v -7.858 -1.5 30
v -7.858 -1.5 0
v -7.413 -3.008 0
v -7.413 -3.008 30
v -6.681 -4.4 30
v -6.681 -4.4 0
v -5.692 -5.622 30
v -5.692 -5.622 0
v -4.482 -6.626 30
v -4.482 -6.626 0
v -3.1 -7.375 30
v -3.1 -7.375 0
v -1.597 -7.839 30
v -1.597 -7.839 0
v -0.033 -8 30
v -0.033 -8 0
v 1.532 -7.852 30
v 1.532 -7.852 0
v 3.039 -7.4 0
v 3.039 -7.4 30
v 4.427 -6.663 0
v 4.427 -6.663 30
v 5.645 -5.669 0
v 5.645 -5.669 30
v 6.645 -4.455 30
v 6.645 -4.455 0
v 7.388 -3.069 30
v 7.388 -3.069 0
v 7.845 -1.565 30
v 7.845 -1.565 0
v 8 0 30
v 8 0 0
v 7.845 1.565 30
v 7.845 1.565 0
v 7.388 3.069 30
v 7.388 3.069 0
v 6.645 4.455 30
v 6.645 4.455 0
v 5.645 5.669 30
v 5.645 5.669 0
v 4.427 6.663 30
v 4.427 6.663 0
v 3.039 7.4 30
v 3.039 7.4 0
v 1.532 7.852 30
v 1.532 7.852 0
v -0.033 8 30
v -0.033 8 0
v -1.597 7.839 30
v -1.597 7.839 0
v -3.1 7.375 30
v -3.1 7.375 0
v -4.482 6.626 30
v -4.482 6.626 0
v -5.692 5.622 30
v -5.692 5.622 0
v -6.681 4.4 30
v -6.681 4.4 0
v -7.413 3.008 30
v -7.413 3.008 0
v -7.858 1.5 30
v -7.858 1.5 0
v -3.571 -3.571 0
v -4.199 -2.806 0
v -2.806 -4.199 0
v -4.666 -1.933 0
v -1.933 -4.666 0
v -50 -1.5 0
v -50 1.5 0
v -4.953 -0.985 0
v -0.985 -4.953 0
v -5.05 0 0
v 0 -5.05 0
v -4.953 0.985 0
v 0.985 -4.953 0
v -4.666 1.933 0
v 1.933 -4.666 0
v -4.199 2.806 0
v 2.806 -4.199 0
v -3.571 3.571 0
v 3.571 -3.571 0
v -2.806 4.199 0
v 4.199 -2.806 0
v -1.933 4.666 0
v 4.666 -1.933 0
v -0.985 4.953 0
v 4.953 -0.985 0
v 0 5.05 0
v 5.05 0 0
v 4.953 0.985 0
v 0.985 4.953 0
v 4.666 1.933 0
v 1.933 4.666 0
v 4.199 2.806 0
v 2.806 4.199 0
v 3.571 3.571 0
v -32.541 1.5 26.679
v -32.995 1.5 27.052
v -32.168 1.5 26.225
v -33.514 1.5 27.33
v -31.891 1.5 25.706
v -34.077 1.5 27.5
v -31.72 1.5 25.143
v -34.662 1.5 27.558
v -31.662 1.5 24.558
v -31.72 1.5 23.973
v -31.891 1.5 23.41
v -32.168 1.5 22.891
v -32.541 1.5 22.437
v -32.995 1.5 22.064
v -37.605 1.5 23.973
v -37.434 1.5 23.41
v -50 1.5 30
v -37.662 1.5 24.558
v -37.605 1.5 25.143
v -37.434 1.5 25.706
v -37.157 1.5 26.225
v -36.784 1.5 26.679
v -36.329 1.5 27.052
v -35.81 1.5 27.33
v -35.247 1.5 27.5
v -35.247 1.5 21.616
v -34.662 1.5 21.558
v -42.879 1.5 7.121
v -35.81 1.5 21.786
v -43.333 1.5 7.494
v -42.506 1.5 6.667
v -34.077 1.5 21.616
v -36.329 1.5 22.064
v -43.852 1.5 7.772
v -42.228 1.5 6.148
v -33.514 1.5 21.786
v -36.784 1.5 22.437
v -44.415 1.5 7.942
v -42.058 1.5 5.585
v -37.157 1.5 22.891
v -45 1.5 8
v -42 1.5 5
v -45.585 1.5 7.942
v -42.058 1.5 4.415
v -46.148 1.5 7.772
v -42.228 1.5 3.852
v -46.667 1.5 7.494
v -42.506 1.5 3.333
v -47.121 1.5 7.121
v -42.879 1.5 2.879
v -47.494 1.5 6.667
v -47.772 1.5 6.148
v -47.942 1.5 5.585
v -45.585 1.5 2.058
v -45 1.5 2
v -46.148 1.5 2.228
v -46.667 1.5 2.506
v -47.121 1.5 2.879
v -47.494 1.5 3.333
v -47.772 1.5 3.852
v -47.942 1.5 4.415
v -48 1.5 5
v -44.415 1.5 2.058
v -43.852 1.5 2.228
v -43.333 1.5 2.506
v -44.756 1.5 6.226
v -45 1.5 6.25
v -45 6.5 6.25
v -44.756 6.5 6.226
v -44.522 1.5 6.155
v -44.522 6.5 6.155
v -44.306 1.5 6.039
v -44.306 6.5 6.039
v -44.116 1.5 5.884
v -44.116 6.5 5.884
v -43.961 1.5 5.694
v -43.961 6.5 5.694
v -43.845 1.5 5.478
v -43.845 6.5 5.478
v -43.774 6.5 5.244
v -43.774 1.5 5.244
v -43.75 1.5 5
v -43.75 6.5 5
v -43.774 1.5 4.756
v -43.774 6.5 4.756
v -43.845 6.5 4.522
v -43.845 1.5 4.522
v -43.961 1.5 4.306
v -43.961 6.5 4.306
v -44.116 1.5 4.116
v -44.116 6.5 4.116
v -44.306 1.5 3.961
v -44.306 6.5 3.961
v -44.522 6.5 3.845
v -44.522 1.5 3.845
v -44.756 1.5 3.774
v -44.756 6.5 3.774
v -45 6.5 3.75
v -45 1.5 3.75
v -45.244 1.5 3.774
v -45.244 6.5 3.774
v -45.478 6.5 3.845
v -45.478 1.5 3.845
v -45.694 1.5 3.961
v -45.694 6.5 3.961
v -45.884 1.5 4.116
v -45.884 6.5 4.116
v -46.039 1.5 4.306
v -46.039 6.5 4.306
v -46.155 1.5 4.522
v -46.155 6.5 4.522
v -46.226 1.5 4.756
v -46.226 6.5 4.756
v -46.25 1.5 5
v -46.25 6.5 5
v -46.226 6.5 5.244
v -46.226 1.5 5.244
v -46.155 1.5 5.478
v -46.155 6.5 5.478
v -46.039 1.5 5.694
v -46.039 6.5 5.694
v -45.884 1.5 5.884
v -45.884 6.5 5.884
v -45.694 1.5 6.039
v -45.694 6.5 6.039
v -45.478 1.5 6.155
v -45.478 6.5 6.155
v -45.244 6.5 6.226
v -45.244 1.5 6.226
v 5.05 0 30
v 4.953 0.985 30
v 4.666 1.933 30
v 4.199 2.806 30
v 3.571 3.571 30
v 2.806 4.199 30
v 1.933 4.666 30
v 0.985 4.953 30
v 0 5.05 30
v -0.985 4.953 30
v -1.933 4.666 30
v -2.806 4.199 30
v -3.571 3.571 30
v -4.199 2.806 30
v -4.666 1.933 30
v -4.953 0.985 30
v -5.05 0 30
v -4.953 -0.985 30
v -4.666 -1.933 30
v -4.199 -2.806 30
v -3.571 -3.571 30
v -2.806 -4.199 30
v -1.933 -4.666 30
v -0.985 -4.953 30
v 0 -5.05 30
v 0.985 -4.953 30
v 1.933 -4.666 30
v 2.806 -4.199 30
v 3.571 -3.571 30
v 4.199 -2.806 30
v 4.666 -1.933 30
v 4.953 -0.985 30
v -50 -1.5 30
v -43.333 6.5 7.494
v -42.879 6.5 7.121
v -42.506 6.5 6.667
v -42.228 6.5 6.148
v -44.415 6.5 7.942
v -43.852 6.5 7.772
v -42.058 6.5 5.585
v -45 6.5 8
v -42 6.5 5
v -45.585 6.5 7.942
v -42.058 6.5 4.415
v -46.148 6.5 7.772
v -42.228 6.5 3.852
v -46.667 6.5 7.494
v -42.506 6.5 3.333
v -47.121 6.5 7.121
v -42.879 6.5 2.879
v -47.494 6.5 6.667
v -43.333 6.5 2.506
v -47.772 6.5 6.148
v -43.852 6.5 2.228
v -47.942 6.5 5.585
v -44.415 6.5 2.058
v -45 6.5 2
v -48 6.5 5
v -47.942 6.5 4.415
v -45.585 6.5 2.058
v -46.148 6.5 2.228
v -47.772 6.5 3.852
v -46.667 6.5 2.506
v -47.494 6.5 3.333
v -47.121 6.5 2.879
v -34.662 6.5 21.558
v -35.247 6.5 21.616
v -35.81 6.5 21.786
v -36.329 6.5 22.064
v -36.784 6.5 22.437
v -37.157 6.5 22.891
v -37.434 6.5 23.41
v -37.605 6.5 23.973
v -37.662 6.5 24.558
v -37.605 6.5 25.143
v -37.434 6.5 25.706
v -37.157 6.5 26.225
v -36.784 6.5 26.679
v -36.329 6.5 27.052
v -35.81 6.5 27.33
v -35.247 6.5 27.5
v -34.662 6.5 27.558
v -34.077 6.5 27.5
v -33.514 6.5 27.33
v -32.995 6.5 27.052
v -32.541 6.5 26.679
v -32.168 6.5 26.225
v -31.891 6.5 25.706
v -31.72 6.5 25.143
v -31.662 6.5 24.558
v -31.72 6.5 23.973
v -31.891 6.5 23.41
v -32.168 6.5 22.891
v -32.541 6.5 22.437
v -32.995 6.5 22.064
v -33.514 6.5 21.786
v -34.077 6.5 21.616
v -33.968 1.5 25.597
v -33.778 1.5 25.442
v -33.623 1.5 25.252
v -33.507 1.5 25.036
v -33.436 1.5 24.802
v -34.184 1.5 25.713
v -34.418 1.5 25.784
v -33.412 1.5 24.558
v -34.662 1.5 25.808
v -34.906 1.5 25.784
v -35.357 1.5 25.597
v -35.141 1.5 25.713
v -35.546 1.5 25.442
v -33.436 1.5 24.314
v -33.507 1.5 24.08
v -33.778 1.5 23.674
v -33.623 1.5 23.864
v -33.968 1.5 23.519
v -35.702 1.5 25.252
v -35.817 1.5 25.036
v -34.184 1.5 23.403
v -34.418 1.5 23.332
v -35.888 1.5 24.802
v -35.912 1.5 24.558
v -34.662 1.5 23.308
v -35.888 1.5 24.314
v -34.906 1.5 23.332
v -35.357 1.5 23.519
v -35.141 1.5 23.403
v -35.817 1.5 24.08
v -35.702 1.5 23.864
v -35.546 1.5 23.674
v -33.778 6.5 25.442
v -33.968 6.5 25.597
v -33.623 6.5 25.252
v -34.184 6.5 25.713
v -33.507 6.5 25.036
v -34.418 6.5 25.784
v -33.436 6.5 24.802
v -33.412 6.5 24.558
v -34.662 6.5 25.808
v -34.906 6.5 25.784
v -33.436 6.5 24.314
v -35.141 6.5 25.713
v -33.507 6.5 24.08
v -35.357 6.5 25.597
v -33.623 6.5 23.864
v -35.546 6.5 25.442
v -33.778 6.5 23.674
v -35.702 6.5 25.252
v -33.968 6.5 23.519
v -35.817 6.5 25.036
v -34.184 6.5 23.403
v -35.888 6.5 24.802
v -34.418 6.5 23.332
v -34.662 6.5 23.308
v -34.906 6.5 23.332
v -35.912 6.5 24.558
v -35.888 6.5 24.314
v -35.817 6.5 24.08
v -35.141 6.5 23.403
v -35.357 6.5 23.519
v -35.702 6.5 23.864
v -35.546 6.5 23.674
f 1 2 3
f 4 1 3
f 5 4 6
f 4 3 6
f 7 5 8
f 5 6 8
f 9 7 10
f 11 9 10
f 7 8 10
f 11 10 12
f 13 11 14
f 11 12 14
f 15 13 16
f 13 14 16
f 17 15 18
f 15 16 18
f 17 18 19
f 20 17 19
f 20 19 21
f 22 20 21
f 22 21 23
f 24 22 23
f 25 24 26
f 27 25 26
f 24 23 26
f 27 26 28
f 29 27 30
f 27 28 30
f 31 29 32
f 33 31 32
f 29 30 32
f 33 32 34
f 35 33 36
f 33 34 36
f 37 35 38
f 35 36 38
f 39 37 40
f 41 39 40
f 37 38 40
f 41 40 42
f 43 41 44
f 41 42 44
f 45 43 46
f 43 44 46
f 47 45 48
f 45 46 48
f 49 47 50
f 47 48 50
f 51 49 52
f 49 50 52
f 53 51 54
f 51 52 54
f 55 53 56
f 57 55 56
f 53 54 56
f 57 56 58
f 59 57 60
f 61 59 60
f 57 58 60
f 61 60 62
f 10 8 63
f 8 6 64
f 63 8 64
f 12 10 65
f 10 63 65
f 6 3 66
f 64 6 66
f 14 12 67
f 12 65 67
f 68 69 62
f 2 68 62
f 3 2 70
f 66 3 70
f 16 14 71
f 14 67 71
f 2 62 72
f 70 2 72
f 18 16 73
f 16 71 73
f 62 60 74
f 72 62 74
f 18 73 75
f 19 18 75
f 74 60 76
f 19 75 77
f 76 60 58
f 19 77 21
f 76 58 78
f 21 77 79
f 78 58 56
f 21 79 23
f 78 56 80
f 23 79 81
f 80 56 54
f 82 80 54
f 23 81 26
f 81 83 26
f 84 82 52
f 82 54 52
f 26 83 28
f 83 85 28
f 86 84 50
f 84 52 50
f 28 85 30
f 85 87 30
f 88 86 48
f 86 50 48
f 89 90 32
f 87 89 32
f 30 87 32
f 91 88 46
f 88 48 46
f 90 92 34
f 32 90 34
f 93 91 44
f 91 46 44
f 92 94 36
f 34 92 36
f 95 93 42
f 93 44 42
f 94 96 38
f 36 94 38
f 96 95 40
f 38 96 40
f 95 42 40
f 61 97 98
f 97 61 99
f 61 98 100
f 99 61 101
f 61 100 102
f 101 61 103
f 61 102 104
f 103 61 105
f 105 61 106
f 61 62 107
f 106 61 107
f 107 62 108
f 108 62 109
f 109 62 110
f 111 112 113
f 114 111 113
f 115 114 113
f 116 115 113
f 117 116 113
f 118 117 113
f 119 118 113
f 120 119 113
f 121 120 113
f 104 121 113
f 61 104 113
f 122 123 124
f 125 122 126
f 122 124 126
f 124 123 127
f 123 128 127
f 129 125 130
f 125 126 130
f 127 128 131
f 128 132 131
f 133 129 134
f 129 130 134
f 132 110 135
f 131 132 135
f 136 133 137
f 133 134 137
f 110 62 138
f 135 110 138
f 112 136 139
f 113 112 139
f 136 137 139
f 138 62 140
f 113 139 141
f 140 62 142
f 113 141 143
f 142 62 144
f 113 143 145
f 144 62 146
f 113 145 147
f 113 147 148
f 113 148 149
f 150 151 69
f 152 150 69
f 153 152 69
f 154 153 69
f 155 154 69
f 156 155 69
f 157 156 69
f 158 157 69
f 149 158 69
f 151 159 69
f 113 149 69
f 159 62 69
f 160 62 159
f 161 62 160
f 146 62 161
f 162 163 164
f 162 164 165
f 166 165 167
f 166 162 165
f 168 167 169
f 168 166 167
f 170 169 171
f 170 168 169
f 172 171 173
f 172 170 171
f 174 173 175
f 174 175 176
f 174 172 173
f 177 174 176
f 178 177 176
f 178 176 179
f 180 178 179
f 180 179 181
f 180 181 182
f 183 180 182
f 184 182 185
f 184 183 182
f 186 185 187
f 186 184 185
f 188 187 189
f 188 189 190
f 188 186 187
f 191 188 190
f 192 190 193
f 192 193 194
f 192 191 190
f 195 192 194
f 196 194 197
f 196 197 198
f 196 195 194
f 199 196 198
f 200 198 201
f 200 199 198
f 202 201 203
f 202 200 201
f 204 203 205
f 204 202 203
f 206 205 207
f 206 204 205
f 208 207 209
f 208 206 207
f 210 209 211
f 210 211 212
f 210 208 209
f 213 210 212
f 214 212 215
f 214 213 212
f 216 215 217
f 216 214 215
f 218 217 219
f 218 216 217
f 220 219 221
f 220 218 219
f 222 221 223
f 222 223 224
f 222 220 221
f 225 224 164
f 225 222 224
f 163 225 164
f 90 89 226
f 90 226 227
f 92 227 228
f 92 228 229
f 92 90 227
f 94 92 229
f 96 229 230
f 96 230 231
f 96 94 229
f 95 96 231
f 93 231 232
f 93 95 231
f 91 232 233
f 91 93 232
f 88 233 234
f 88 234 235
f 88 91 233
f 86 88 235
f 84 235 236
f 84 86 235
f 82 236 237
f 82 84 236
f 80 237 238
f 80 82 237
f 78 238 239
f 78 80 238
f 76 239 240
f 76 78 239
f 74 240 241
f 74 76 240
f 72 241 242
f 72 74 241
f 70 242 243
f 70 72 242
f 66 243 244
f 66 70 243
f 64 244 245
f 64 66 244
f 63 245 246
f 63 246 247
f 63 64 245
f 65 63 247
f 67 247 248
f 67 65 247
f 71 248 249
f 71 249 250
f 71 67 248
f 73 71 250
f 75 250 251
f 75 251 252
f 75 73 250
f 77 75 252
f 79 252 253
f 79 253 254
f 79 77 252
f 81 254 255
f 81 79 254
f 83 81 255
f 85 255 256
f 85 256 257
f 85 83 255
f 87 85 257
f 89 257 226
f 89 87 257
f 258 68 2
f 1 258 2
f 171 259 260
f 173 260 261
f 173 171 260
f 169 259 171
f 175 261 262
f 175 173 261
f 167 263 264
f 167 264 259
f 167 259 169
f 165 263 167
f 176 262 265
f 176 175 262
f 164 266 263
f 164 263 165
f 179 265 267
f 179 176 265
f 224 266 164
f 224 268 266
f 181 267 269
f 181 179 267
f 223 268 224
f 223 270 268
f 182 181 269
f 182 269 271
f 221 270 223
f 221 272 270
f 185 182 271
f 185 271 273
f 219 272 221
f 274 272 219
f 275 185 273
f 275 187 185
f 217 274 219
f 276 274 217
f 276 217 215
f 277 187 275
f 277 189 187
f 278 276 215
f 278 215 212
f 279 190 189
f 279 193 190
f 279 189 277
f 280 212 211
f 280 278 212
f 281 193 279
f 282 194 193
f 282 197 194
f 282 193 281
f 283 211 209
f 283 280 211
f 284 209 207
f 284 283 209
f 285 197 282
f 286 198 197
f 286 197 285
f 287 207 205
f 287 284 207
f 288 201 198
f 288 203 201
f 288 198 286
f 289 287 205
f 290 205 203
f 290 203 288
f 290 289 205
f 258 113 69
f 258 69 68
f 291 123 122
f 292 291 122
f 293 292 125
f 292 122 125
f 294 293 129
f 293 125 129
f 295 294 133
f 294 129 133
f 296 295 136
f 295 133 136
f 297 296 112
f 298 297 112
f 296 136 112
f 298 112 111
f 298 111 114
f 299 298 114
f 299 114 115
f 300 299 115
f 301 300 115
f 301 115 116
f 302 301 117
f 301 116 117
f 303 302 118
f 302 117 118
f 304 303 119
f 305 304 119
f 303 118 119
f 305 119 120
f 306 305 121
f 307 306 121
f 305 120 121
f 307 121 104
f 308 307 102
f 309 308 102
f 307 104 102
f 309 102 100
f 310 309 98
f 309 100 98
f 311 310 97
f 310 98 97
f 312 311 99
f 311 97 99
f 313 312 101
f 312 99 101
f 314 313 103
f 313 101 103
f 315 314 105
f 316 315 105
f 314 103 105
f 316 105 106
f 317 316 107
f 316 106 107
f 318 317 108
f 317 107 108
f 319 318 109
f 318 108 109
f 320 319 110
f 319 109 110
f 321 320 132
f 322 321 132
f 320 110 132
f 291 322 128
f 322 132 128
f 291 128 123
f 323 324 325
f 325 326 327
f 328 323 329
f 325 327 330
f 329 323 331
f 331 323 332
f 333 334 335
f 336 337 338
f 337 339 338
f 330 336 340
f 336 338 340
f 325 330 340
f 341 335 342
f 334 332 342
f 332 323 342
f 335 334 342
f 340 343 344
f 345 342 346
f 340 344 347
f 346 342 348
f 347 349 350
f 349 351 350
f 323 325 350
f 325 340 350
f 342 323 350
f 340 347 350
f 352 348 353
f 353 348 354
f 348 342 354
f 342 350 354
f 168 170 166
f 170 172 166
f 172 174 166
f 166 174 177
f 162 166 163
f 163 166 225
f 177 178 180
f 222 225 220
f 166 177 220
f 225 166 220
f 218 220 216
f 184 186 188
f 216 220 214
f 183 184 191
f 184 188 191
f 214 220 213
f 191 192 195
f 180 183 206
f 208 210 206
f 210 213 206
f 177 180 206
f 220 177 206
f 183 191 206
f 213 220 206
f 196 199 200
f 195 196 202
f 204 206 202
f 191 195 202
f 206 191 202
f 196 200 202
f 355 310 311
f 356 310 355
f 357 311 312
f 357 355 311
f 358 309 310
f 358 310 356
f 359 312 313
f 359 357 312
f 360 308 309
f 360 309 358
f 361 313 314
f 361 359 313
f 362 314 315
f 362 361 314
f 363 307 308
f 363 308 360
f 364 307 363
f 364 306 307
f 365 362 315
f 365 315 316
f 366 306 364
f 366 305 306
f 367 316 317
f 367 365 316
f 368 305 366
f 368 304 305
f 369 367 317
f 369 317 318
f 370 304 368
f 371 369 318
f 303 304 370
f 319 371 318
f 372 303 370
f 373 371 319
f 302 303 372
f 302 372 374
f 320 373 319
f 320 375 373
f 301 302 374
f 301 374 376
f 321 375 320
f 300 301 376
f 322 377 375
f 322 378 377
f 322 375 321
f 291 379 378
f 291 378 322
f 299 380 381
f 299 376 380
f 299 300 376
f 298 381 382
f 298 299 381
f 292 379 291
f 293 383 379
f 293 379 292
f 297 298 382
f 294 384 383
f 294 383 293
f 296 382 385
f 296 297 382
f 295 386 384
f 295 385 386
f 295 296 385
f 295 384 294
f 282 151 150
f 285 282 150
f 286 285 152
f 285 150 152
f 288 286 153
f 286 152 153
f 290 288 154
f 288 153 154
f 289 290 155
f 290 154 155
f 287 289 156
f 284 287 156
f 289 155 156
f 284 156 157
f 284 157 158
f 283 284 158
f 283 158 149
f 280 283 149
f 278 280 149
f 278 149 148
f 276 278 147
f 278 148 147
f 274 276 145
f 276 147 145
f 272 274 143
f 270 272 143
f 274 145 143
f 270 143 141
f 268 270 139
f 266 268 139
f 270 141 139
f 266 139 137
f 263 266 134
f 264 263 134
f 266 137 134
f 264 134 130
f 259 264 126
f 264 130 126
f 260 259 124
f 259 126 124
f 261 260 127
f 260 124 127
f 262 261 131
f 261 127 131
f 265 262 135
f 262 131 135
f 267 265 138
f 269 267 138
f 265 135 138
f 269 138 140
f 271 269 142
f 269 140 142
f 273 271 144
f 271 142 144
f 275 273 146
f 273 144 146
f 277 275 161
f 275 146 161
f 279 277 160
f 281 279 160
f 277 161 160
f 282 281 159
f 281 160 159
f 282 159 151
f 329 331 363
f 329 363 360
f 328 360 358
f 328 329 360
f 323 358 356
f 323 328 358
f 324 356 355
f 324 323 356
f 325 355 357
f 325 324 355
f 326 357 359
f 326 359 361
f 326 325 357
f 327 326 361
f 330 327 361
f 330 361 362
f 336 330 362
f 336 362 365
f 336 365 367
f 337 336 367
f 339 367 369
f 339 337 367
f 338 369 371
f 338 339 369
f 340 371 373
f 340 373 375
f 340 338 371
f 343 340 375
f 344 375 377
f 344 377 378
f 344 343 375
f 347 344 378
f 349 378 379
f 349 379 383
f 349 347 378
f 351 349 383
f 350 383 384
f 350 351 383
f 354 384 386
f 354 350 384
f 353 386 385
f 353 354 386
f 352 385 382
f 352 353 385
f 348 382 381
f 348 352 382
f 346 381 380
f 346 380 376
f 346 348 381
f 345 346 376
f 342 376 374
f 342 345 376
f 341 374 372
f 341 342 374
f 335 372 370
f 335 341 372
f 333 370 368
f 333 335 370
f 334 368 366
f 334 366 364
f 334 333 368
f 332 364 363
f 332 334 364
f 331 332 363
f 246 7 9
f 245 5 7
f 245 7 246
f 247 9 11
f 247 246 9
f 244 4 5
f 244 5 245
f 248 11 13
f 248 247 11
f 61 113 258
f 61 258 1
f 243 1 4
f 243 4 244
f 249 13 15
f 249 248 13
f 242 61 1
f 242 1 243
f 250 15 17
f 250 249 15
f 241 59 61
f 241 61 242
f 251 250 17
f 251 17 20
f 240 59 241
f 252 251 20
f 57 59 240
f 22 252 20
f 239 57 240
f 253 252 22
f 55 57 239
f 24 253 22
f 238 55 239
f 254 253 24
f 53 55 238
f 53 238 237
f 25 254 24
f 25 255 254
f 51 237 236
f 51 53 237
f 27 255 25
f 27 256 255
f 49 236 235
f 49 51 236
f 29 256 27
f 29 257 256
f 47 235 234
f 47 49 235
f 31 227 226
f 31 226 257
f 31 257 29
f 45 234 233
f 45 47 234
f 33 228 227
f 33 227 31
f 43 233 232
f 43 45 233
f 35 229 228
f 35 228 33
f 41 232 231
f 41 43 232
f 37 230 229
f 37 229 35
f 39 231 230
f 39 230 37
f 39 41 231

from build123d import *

# Parameters (mm, degrees)
SKETCH1_R           = 5.05
BOSS_EXTRUDE1_DEPTH = 30
SKETCH2_R           = 3
SKETCH2_R_2         = 1.25
BOSS_EXTRUDE2_DEPTH = 5


with BuildPart() as part:
    # Sketch1 → Boss-Extrude1 (new body)
    with BuildSketch(Plane.XY):
        with BuildLine():
            Line((-7.858116823, 1.5), (-50, 1.5))
            Line((-50, 1.5), (-50, -1.5))
            Line((-50, -1.5), (-7.858116823, -1.5))
            ThreePointArc((-7.858116823, -1.5), (8, 0), (-7.858116823, 1.5))
        make_face()
        Circle(SKETCH1_R, mode=Mode.SUBTRACT)
    extrude(amount=BOSS_EXTRUDE1_DEPTH)

    # Sketch2 → Boss-Extrude2 (add)
    # profile 1 of 2: a face of its own
    with BuildSketch(Plane(origin=(0, 1.5, 0), x_dir=(1, 0, 0), z_dir=(0, 1, 0))):
        with Locations(Location((-45, -5, 0), (0, 0, 90))):
            Circle(SKETCH2_R)
        with Locations(Location((-45, -5, 0), (0, 0, 270))):
            Circle(SKETCH2_R_2, mode=Mode.SUBTRACT)
    # profile 2 of 2: a face of its own
    with BuildSketch(Plane(origin=(0, 1.5, 0), x_dir=(1, 0, 0), z_dir=(0, 1, 0))):
        with Locations(Location((-34.6622, -24.558, 0), (0, 0, 90))):
            Circle(SKETCH2_R)
        with Locations(Location((-34.6622, -24.558, 0), (0, 0, 270))):
            Circle(SKETCH2_R_2, mode=Mode.SUBTRACT)
    extrude(amount=BOSS_EXTRUDE2_DEPTH)


solid = part.part
